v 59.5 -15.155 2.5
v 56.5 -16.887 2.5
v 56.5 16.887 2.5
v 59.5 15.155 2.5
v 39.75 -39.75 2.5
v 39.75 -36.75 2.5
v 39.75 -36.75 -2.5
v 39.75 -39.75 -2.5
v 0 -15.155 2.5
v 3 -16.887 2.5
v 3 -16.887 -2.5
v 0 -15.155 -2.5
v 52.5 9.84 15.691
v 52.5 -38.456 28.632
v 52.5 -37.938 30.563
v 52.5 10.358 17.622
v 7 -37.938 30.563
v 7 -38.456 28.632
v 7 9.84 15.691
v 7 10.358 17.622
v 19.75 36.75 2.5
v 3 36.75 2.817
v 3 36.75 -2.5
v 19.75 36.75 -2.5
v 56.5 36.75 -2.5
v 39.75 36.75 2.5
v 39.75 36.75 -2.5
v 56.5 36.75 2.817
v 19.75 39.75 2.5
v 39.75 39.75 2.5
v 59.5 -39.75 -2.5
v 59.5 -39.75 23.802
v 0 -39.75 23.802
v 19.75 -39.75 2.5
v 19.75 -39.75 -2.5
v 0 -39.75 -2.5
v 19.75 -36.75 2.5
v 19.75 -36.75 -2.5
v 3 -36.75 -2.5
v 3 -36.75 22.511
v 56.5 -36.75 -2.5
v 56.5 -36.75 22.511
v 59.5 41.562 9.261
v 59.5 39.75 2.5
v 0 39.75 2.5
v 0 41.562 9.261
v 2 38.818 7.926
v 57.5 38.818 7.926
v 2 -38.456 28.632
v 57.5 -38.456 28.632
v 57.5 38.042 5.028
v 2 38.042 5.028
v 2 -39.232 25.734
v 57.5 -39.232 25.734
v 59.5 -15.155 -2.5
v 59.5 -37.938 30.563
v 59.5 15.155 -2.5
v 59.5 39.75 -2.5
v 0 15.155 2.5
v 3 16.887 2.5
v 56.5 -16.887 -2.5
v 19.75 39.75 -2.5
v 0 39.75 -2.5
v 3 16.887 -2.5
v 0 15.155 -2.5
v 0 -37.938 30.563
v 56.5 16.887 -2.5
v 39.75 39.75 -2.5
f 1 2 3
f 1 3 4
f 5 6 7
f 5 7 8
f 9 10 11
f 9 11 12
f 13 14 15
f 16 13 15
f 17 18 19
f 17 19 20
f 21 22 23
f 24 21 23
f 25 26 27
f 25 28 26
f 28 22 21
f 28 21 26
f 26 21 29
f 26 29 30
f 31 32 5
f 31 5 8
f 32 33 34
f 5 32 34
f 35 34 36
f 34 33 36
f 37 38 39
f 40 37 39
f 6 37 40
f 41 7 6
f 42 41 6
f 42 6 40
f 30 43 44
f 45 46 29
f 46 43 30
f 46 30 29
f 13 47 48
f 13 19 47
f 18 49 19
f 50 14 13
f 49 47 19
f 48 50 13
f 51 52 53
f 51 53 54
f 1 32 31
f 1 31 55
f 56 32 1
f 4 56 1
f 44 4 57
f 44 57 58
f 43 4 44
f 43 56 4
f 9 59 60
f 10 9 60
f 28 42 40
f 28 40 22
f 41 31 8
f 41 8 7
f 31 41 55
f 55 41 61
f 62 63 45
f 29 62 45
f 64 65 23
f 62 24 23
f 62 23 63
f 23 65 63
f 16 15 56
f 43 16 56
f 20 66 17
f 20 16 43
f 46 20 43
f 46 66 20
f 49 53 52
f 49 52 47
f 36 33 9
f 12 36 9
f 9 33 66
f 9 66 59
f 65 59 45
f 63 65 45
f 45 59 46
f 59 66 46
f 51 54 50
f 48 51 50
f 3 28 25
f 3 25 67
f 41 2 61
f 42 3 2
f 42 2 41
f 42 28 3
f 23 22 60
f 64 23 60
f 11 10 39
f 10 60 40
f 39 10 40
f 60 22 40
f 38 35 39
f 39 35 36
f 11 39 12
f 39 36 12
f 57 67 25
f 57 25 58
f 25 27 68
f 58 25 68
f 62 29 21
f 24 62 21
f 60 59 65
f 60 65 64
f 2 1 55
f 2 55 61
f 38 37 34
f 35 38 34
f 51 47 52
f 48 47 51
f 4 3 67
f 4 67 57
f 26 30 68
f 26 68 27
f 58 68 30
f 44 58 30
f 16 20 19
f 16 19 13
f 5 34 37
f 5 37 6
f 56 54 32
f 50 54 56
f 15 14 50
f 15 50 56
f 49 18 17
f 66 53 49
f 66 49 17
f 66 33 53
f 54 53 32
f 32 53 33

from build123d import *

# Parameters (mm, degrees)
BOSS_EXTRUDE1_DEPTH = 59.5
SKETCH4_W           = 55.5
SKETCH4_H           = 3
CUT_EXTRUDE1_DEPTH  = 80
SKETCH5_W           = 45.5
SKETCH5_H           = 2
CUT_EXTRUDE2_DEPTH  = 50
CUT_EXTRUDE3_START  = -3
CUT_EXTRUDE3_DEPTH  = 53.5
SKETCH7_W           = 20
SKETCH7_H           = 3
CUT_EXTRUDE4_DEPTH  = 5


with BuildPart() as part:
    # Sketch3 → Boss-Extrude1 (new body)
    with BuildSketch(Plane.YZ):
        Polygon((39.75, -2.5), (39.75, 2.5), (41.561733316, 9.261480784), (-37.938266684, 30.563441582), (-39.75, 23.801960798), (-39.75, -2.5), align=None)
    extrude(amount=BOSS_EXTRUDE1_DEPTH)

    # Sketch4 → Cut-Extrude1 (cut)
    with BuildSketch(Plane(origin=(0, -43.0377451, 11.531929044), x_dir=(1, 0, 0), z_dir=(0, -0.9659258262890679, 0.25881904510252235))):
        with Locations((29.75, 16.202871609)):
            Rectangle(SKETCH4_W, SKETCH4_H)
    extrude(amount=-CUT_EXTRUDE1_DEPTH, mode=Mode.SUBTRACT)

    # Sketch5 → Cut-Extrude2 (cut)
    with BuildSketch(Plane(origin=(0, -43.0377451, 11.531929044), x_dir=(1, 0, 0), z_dir=(0, -0.9659258262890679, 0.25881904510252235))):
        with Locations((29.75, 18.702871609)):
            Rectangle(SKETCH5_W, SKETCH5_H)
    extrude(amount=-CUT_EXTRUDE2_DEPTH, mode=Mode.SUBTRACT)

    # Sketch6 → Cut-Extrude3 (cut)
    with BuildSketch(Plane.YZ.offset(59.5).offset(CUT_EXTRUDE3_START)):
        Polygon((-36.75, -6.898480781), (-36.75, 22.511144618), (36.75, 2.816878974), (36.75, -6.898480781), align=None)
    extrude(amount=-CUT_EXTRUDE3_DEPTH, mode=Mode.SUBTRACT)

    # Sketch7 → Cut-Extrude4 (cut)
    with BuildSketch(Plane(origin=(0, 0, -2.5), x_dir=(1, 0, 0), z_dir=(0, 0, -1))):
        with Locations((29.75, 38.25)):
            Rectangle(SKETCH7_W, SKETCH7_H)
        Polygon((3, -16.887495374), (3, 16.887495374), (-26.25, 0), align=None)
        Polygon((56.5, -16.887495374), (85.75, 0), (56.5, 16.887495374), align=None)
        with Locations((29.75, -38.25)):
            Rectangle(SKETCH7_W, SKETCH7_H)
    extrude(amount=-CUT_EXTRUDE4_DEPTH, mode=Mode.SUBTRACT)


solid = part.part
